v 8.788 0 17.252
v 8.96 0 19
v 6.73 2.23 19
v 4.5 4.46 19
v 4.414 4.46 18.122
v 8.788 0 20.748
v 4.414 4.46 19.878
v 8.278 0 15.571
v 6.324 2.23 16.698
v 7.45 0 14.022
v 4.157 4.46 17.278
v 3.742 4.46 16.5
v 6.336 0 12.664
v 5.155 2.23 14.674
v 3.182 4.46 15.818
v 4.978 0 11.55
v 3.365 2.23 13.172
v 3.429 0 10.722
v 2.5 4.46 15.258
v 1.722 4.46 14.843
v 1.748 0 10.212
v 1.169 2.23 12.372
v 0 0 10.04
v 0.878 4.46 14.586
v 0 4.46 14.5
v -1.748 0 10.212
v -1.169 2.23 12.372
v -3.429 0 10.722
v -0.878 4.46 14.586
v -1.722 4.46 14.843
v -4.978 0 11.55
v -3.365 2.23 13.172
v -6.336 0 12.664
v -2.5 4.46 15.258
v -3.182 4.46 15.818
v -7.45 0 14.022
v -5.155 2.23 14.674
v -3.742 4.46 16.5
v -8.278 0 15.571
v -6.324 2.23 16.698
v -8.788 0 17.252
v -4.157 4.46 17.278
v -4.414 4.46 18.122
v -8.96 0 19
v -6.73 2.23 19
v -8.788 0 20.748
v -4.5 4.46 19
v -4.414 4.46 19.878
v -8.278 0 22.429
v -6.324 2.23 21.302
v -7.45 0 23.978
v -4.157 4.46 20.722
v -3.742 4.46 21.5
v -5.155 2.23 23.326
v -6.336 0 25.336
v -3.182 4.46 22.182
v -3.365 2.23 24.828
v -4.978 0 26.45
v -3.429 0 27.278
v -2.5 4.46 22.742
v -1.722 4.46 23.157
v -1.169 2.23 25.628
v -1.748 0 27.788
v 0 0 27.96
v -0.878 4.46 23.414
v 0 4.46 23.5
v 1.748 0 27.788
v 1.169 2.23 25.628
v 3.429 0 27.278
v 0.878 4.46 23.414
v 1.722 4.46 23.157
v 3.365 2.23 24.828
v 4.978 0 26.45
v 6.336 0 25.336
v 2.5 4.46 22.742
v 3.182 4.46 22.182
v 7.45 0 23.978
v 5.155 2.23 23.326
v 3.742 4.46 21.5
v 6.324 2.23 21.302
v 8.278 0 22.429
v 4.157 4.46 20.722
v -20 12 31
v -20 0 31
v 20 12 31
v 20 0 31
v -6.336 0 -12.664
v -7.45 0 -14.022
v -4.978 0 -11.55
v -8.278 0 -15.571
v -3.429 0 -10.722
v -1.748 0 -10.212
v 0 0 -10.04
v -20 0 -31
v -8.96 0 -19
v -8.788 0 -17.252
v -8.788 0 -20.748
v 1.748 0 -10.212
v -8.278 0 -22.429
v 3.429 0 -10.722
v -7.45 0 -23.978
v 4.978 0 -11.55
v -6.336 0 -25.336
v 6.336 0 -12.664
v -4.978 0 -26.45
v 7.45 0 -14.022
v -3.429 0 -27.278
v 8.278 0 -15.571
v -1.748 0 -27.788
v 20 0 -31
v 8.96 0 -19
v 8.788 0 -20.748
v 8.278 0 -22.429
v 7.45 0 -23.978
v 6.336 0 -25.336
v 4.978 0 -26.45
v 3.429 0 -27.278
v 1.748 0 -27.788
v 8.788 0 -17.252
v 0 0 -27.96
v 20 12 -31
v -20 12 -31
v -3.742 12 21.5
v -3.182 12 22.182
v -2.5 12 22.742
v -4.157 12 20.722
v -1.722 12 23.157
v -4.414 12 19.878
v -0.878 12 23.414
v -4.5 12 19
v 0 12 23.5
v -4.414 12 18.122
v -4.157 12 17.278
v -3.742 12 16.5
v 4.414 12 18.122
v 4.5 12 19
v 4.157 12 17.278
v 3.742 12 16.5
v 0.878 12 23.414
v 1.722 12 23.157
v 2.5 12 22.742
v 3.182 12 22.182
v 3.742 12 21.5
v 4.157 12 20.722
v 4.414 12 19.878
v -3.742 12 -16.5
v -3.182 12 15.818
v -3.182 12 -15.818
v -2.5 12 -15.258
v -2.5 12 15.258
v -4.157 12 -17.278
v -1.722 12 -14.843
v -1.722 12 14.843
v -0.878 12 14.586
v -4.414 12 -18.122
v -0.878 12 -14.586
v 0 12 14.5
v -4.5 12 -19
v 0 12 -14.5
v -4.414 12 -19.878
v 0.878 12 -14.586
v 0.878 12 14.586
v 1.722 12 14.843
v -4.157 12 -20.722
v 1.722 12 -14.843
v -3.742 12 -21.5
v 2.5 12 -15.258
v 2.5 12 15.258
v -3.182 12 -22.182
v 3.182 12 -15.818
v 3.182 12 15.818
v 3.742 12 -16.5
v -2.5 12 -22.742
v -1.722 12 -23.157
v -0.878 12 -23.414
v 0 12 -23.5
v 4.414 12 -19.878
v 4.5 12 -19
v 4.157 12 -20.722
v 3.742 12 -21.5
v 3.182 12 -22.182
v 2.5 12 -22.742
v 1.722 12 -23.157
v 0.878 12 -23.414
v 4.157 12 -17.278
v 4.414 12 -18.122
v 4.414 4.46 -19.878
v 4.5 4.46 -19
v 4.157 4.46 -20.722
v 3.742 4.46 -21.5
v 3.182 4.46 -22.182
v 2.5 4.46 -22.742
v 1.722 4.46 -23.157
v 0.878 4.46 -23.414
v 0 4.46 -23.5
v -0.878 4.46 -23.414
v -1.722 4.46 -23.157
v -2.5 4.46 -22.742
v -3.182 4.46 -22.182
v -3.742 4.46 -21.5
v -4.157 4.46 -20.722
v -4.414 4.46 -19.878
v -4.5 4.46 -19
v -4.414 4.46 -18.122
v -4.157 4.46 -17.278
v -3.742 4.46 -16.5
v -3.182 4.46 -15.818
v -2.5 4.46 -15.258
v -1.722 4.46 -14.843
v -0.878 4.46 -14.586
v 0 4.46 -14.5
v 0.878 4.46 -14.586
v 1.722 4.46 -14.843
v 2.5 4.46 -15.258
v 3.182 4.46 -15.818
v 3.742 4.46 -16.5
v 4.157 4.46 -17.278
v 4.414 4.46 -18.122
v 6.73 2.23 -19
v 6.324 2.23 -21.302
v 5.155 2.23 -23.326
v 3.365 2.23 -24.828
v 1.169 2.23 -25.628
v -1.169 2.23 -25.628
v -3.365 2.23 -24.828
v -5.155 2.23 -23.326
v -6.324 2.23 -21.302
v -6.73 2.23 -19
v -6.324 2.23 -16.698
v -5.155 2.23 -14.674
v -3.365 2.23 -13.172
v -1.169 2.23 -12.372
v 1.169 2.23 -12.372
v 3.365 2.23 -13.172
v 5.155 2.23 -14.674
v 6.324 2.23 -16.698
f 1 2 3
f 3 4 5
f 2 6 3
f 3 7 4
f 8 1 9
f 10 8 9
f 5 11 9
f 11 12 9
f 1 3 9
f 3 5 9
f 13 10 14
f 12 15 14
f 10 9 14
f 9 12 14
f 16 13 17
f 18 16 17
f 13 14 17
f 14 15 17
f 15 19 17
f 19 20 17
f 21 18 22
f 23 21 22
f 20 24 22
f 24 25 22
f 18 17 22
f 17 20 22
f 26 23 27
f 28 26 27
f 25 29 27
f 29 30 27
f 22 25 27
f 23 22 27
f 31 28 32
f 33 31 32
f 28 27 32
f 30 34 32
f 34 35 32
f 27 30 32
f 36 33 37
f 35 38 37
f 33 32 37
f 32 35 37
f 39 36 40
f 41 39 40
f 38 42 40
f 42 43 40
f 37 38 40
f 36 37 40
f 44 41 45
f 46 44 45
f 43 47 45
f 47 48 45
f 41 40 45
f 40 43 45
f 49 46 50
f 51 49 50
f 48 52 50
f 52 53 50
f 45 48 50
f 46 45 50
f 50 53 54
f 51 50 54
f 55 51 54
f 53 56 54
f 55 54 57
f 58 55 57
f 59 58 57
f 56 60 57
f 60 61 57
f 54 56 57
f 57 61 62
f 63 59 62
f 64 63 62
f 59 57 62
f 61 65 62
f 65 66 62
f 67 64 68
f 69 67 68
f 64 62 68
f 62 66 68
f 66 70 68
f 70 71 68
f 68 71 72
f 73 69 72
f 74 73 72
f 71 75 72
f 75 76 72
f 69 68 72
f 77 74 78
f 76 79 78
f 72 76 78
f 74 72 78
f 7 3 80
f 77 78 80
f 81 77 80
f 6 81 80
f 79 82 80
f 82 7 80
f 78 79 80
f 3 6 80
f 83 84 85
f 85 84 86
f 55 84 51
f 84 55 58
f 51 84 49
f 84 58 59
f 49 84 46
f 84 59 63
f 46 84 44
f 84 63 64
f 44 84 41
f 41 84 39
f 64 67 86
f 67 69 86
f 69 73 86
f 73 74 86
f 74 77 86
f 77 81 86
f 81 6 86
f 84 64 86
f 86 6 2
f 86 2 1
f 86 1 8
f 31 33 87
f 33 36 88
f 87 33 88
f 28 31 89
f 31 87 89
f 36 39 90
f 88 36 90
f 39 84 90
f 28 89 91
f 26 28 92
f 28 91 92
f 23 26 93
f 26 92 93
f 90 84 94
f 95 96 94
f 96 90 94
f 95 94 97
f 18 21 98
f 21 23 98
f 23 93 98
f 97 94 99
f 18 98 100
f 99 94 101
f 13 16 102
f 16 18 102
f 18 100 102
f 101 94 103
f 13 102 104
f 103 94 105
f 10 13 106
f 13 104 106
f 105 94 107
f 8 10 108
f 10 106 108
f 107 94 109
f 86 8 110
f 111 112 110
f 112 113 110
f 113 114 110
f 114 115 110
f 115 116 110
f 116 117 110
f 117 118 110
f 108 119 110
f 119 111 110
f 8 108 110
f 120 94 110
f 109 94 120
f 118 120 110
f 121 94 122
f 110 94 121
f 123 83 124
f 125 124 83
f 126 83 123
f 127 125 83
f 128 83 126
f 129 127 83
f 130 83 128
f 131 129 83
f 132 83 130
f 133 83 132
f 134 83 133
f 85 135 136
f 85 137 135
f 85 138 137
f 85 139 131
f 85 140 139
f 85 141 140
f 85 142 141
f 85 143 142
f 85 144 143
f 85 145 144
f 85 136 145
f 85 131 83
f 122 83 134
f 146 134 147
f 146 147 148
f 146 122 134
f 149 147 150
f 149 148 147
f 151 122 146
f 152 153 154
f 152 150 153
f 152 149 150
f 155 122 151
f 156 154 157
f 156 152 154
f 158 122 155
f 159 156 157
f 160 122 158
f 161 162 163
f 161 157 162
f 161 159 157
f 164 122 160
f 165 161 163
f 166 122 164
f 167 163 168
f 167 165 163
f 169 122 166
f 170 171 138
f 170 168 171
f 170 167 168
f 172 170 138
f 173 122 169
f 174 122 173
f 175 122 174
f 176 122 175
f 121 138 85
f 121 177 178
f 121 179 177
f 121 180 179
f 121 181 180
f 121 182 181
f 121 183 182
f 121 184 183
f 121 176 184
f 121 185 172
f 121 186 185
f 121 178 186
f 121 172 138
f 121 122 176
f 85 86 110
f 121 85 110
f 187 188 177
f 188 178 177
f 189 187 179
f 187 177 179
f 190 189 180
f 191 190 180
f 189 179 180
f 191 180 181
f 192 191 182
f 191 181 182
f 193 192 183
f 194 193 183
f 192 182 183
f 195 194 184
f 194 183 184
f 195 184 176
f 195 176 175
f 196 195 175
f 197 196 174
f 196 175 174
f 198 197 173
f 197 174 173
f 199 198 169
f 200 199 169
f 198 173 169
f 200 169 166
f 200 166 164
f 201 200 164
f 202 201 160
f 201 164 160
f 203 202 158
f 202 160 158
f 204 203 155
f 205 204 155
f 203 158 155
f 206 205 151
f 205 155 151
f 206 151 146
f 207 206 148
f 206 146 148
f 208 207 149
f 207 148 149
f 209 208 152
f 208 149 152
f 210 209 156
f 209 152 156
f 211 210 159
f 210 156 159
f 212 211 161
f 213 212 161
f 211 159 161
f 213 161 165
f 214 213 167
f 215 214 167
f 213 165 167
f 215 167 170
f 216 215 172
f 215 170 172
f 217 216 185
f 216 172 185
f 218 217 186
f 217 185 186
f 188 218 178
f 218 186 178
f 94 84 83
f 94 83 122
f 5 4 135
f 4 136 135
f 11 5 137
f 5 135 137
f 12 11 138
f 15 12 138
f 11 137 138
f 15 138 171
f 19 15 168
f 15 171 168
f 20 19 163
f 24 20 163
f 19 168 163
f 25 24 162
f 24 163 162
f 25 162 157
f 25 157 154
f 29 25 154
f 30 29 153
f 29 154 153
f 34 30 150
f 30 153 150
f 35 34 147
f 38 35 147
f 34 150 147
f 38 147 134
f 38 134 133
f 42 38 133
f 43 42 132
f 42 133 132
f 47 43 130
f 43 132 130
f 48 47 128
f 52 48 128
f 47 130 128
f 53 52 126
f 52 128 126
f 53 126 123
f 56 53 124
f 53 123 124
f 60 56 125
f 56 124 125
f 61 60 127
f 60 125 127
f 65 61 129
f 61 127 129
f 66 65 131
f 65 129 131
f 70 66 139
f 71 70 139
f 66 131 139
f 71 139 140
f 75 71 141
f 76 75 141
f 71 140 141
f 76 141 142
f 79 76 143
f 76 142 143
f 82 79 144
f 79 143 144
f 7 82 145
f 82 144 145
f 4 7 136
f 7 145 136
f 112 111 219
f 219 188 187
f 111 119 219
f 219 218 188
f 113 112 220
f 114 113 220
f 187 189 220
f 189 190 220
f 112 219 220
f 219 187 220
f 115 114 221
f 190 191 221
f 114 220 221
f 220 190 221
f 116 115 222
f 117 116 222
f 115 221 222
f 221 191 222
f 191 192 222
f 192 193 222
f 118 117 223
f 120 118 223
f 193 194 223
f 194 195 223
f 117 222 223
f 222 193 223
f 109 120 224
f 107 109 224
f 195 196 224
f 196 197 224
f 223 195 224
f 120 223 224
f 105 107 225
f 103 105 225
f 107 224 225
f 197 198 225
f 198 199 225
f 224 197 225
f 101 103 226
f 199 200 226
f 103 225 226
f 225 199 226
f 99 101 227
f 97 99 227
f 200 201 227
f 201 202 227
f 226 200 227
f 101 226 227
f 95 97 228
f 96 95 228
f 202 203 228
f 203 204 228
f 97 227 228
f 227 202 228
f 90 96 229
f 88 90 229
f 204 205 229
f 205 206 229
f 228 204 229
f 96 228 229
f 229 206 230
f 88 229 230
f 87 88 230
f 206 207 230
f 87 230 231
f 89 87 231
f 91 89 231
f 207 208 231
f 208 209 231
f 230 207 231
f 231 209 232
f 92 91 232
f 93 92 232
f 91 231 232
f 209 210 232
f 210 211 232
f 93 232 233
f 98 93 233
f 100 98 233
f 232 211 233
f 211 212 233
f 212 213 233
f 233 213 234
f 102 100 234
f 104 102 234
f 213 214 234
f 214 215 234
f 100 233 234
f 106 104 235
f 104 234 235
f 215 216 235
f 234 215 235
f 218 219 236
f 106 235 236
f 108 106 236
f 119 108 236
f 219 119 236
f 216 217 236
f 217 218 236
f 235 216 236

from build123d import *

# Parameters (mm, degrees)
SKETCH1_W           = 40
SKETCH1_H           = 62
BOSS_EXTRUDE1_DEPTH = 12


# Read off the part's stored shape, not the designer's step: AdvancedHole1
with BuildPart() as part:
    # Sketch1 → Boss-Extrude1 (new body)
    with BuildSketch(Plane(origin=(0, 0, 0), x_dir=(1, 0, 0), z_dir=(0, 1, 0))):
        Rectangle(SKETCH1_W, SKETCH1_H)
    extrude(amount=BOSS_EXTRUDE1_DEPTH)

    # AdvancedHole1 outline → AdvancedHole1 (revolve, cut)
    with BuildSketch(Plane.XY.offset(-19)):
        Polygon((4.5, 4.46), (4.5, 12), (0, 12), (0, 0), (8.96, 0), align=None)
    revolve(axis=Axis((0, 0, -19), (0, 1, 0)), mode=Mode.SUBTRACT)

    # AdvancedHole1 2 outline → AdvancedHole1 2 (revolve, cut)
    with BuildSketch(Plane.XY.offset(19)):
        Polygon((4.5, 4.46), (4.5, 12), (0, 12), (0, 0), (8.96, 0), align=None)
    revolve(axis=Axis((0, 0, 19), (0, 1, 0)), mode=Mode.SUBTRACT)


solid = part.part
